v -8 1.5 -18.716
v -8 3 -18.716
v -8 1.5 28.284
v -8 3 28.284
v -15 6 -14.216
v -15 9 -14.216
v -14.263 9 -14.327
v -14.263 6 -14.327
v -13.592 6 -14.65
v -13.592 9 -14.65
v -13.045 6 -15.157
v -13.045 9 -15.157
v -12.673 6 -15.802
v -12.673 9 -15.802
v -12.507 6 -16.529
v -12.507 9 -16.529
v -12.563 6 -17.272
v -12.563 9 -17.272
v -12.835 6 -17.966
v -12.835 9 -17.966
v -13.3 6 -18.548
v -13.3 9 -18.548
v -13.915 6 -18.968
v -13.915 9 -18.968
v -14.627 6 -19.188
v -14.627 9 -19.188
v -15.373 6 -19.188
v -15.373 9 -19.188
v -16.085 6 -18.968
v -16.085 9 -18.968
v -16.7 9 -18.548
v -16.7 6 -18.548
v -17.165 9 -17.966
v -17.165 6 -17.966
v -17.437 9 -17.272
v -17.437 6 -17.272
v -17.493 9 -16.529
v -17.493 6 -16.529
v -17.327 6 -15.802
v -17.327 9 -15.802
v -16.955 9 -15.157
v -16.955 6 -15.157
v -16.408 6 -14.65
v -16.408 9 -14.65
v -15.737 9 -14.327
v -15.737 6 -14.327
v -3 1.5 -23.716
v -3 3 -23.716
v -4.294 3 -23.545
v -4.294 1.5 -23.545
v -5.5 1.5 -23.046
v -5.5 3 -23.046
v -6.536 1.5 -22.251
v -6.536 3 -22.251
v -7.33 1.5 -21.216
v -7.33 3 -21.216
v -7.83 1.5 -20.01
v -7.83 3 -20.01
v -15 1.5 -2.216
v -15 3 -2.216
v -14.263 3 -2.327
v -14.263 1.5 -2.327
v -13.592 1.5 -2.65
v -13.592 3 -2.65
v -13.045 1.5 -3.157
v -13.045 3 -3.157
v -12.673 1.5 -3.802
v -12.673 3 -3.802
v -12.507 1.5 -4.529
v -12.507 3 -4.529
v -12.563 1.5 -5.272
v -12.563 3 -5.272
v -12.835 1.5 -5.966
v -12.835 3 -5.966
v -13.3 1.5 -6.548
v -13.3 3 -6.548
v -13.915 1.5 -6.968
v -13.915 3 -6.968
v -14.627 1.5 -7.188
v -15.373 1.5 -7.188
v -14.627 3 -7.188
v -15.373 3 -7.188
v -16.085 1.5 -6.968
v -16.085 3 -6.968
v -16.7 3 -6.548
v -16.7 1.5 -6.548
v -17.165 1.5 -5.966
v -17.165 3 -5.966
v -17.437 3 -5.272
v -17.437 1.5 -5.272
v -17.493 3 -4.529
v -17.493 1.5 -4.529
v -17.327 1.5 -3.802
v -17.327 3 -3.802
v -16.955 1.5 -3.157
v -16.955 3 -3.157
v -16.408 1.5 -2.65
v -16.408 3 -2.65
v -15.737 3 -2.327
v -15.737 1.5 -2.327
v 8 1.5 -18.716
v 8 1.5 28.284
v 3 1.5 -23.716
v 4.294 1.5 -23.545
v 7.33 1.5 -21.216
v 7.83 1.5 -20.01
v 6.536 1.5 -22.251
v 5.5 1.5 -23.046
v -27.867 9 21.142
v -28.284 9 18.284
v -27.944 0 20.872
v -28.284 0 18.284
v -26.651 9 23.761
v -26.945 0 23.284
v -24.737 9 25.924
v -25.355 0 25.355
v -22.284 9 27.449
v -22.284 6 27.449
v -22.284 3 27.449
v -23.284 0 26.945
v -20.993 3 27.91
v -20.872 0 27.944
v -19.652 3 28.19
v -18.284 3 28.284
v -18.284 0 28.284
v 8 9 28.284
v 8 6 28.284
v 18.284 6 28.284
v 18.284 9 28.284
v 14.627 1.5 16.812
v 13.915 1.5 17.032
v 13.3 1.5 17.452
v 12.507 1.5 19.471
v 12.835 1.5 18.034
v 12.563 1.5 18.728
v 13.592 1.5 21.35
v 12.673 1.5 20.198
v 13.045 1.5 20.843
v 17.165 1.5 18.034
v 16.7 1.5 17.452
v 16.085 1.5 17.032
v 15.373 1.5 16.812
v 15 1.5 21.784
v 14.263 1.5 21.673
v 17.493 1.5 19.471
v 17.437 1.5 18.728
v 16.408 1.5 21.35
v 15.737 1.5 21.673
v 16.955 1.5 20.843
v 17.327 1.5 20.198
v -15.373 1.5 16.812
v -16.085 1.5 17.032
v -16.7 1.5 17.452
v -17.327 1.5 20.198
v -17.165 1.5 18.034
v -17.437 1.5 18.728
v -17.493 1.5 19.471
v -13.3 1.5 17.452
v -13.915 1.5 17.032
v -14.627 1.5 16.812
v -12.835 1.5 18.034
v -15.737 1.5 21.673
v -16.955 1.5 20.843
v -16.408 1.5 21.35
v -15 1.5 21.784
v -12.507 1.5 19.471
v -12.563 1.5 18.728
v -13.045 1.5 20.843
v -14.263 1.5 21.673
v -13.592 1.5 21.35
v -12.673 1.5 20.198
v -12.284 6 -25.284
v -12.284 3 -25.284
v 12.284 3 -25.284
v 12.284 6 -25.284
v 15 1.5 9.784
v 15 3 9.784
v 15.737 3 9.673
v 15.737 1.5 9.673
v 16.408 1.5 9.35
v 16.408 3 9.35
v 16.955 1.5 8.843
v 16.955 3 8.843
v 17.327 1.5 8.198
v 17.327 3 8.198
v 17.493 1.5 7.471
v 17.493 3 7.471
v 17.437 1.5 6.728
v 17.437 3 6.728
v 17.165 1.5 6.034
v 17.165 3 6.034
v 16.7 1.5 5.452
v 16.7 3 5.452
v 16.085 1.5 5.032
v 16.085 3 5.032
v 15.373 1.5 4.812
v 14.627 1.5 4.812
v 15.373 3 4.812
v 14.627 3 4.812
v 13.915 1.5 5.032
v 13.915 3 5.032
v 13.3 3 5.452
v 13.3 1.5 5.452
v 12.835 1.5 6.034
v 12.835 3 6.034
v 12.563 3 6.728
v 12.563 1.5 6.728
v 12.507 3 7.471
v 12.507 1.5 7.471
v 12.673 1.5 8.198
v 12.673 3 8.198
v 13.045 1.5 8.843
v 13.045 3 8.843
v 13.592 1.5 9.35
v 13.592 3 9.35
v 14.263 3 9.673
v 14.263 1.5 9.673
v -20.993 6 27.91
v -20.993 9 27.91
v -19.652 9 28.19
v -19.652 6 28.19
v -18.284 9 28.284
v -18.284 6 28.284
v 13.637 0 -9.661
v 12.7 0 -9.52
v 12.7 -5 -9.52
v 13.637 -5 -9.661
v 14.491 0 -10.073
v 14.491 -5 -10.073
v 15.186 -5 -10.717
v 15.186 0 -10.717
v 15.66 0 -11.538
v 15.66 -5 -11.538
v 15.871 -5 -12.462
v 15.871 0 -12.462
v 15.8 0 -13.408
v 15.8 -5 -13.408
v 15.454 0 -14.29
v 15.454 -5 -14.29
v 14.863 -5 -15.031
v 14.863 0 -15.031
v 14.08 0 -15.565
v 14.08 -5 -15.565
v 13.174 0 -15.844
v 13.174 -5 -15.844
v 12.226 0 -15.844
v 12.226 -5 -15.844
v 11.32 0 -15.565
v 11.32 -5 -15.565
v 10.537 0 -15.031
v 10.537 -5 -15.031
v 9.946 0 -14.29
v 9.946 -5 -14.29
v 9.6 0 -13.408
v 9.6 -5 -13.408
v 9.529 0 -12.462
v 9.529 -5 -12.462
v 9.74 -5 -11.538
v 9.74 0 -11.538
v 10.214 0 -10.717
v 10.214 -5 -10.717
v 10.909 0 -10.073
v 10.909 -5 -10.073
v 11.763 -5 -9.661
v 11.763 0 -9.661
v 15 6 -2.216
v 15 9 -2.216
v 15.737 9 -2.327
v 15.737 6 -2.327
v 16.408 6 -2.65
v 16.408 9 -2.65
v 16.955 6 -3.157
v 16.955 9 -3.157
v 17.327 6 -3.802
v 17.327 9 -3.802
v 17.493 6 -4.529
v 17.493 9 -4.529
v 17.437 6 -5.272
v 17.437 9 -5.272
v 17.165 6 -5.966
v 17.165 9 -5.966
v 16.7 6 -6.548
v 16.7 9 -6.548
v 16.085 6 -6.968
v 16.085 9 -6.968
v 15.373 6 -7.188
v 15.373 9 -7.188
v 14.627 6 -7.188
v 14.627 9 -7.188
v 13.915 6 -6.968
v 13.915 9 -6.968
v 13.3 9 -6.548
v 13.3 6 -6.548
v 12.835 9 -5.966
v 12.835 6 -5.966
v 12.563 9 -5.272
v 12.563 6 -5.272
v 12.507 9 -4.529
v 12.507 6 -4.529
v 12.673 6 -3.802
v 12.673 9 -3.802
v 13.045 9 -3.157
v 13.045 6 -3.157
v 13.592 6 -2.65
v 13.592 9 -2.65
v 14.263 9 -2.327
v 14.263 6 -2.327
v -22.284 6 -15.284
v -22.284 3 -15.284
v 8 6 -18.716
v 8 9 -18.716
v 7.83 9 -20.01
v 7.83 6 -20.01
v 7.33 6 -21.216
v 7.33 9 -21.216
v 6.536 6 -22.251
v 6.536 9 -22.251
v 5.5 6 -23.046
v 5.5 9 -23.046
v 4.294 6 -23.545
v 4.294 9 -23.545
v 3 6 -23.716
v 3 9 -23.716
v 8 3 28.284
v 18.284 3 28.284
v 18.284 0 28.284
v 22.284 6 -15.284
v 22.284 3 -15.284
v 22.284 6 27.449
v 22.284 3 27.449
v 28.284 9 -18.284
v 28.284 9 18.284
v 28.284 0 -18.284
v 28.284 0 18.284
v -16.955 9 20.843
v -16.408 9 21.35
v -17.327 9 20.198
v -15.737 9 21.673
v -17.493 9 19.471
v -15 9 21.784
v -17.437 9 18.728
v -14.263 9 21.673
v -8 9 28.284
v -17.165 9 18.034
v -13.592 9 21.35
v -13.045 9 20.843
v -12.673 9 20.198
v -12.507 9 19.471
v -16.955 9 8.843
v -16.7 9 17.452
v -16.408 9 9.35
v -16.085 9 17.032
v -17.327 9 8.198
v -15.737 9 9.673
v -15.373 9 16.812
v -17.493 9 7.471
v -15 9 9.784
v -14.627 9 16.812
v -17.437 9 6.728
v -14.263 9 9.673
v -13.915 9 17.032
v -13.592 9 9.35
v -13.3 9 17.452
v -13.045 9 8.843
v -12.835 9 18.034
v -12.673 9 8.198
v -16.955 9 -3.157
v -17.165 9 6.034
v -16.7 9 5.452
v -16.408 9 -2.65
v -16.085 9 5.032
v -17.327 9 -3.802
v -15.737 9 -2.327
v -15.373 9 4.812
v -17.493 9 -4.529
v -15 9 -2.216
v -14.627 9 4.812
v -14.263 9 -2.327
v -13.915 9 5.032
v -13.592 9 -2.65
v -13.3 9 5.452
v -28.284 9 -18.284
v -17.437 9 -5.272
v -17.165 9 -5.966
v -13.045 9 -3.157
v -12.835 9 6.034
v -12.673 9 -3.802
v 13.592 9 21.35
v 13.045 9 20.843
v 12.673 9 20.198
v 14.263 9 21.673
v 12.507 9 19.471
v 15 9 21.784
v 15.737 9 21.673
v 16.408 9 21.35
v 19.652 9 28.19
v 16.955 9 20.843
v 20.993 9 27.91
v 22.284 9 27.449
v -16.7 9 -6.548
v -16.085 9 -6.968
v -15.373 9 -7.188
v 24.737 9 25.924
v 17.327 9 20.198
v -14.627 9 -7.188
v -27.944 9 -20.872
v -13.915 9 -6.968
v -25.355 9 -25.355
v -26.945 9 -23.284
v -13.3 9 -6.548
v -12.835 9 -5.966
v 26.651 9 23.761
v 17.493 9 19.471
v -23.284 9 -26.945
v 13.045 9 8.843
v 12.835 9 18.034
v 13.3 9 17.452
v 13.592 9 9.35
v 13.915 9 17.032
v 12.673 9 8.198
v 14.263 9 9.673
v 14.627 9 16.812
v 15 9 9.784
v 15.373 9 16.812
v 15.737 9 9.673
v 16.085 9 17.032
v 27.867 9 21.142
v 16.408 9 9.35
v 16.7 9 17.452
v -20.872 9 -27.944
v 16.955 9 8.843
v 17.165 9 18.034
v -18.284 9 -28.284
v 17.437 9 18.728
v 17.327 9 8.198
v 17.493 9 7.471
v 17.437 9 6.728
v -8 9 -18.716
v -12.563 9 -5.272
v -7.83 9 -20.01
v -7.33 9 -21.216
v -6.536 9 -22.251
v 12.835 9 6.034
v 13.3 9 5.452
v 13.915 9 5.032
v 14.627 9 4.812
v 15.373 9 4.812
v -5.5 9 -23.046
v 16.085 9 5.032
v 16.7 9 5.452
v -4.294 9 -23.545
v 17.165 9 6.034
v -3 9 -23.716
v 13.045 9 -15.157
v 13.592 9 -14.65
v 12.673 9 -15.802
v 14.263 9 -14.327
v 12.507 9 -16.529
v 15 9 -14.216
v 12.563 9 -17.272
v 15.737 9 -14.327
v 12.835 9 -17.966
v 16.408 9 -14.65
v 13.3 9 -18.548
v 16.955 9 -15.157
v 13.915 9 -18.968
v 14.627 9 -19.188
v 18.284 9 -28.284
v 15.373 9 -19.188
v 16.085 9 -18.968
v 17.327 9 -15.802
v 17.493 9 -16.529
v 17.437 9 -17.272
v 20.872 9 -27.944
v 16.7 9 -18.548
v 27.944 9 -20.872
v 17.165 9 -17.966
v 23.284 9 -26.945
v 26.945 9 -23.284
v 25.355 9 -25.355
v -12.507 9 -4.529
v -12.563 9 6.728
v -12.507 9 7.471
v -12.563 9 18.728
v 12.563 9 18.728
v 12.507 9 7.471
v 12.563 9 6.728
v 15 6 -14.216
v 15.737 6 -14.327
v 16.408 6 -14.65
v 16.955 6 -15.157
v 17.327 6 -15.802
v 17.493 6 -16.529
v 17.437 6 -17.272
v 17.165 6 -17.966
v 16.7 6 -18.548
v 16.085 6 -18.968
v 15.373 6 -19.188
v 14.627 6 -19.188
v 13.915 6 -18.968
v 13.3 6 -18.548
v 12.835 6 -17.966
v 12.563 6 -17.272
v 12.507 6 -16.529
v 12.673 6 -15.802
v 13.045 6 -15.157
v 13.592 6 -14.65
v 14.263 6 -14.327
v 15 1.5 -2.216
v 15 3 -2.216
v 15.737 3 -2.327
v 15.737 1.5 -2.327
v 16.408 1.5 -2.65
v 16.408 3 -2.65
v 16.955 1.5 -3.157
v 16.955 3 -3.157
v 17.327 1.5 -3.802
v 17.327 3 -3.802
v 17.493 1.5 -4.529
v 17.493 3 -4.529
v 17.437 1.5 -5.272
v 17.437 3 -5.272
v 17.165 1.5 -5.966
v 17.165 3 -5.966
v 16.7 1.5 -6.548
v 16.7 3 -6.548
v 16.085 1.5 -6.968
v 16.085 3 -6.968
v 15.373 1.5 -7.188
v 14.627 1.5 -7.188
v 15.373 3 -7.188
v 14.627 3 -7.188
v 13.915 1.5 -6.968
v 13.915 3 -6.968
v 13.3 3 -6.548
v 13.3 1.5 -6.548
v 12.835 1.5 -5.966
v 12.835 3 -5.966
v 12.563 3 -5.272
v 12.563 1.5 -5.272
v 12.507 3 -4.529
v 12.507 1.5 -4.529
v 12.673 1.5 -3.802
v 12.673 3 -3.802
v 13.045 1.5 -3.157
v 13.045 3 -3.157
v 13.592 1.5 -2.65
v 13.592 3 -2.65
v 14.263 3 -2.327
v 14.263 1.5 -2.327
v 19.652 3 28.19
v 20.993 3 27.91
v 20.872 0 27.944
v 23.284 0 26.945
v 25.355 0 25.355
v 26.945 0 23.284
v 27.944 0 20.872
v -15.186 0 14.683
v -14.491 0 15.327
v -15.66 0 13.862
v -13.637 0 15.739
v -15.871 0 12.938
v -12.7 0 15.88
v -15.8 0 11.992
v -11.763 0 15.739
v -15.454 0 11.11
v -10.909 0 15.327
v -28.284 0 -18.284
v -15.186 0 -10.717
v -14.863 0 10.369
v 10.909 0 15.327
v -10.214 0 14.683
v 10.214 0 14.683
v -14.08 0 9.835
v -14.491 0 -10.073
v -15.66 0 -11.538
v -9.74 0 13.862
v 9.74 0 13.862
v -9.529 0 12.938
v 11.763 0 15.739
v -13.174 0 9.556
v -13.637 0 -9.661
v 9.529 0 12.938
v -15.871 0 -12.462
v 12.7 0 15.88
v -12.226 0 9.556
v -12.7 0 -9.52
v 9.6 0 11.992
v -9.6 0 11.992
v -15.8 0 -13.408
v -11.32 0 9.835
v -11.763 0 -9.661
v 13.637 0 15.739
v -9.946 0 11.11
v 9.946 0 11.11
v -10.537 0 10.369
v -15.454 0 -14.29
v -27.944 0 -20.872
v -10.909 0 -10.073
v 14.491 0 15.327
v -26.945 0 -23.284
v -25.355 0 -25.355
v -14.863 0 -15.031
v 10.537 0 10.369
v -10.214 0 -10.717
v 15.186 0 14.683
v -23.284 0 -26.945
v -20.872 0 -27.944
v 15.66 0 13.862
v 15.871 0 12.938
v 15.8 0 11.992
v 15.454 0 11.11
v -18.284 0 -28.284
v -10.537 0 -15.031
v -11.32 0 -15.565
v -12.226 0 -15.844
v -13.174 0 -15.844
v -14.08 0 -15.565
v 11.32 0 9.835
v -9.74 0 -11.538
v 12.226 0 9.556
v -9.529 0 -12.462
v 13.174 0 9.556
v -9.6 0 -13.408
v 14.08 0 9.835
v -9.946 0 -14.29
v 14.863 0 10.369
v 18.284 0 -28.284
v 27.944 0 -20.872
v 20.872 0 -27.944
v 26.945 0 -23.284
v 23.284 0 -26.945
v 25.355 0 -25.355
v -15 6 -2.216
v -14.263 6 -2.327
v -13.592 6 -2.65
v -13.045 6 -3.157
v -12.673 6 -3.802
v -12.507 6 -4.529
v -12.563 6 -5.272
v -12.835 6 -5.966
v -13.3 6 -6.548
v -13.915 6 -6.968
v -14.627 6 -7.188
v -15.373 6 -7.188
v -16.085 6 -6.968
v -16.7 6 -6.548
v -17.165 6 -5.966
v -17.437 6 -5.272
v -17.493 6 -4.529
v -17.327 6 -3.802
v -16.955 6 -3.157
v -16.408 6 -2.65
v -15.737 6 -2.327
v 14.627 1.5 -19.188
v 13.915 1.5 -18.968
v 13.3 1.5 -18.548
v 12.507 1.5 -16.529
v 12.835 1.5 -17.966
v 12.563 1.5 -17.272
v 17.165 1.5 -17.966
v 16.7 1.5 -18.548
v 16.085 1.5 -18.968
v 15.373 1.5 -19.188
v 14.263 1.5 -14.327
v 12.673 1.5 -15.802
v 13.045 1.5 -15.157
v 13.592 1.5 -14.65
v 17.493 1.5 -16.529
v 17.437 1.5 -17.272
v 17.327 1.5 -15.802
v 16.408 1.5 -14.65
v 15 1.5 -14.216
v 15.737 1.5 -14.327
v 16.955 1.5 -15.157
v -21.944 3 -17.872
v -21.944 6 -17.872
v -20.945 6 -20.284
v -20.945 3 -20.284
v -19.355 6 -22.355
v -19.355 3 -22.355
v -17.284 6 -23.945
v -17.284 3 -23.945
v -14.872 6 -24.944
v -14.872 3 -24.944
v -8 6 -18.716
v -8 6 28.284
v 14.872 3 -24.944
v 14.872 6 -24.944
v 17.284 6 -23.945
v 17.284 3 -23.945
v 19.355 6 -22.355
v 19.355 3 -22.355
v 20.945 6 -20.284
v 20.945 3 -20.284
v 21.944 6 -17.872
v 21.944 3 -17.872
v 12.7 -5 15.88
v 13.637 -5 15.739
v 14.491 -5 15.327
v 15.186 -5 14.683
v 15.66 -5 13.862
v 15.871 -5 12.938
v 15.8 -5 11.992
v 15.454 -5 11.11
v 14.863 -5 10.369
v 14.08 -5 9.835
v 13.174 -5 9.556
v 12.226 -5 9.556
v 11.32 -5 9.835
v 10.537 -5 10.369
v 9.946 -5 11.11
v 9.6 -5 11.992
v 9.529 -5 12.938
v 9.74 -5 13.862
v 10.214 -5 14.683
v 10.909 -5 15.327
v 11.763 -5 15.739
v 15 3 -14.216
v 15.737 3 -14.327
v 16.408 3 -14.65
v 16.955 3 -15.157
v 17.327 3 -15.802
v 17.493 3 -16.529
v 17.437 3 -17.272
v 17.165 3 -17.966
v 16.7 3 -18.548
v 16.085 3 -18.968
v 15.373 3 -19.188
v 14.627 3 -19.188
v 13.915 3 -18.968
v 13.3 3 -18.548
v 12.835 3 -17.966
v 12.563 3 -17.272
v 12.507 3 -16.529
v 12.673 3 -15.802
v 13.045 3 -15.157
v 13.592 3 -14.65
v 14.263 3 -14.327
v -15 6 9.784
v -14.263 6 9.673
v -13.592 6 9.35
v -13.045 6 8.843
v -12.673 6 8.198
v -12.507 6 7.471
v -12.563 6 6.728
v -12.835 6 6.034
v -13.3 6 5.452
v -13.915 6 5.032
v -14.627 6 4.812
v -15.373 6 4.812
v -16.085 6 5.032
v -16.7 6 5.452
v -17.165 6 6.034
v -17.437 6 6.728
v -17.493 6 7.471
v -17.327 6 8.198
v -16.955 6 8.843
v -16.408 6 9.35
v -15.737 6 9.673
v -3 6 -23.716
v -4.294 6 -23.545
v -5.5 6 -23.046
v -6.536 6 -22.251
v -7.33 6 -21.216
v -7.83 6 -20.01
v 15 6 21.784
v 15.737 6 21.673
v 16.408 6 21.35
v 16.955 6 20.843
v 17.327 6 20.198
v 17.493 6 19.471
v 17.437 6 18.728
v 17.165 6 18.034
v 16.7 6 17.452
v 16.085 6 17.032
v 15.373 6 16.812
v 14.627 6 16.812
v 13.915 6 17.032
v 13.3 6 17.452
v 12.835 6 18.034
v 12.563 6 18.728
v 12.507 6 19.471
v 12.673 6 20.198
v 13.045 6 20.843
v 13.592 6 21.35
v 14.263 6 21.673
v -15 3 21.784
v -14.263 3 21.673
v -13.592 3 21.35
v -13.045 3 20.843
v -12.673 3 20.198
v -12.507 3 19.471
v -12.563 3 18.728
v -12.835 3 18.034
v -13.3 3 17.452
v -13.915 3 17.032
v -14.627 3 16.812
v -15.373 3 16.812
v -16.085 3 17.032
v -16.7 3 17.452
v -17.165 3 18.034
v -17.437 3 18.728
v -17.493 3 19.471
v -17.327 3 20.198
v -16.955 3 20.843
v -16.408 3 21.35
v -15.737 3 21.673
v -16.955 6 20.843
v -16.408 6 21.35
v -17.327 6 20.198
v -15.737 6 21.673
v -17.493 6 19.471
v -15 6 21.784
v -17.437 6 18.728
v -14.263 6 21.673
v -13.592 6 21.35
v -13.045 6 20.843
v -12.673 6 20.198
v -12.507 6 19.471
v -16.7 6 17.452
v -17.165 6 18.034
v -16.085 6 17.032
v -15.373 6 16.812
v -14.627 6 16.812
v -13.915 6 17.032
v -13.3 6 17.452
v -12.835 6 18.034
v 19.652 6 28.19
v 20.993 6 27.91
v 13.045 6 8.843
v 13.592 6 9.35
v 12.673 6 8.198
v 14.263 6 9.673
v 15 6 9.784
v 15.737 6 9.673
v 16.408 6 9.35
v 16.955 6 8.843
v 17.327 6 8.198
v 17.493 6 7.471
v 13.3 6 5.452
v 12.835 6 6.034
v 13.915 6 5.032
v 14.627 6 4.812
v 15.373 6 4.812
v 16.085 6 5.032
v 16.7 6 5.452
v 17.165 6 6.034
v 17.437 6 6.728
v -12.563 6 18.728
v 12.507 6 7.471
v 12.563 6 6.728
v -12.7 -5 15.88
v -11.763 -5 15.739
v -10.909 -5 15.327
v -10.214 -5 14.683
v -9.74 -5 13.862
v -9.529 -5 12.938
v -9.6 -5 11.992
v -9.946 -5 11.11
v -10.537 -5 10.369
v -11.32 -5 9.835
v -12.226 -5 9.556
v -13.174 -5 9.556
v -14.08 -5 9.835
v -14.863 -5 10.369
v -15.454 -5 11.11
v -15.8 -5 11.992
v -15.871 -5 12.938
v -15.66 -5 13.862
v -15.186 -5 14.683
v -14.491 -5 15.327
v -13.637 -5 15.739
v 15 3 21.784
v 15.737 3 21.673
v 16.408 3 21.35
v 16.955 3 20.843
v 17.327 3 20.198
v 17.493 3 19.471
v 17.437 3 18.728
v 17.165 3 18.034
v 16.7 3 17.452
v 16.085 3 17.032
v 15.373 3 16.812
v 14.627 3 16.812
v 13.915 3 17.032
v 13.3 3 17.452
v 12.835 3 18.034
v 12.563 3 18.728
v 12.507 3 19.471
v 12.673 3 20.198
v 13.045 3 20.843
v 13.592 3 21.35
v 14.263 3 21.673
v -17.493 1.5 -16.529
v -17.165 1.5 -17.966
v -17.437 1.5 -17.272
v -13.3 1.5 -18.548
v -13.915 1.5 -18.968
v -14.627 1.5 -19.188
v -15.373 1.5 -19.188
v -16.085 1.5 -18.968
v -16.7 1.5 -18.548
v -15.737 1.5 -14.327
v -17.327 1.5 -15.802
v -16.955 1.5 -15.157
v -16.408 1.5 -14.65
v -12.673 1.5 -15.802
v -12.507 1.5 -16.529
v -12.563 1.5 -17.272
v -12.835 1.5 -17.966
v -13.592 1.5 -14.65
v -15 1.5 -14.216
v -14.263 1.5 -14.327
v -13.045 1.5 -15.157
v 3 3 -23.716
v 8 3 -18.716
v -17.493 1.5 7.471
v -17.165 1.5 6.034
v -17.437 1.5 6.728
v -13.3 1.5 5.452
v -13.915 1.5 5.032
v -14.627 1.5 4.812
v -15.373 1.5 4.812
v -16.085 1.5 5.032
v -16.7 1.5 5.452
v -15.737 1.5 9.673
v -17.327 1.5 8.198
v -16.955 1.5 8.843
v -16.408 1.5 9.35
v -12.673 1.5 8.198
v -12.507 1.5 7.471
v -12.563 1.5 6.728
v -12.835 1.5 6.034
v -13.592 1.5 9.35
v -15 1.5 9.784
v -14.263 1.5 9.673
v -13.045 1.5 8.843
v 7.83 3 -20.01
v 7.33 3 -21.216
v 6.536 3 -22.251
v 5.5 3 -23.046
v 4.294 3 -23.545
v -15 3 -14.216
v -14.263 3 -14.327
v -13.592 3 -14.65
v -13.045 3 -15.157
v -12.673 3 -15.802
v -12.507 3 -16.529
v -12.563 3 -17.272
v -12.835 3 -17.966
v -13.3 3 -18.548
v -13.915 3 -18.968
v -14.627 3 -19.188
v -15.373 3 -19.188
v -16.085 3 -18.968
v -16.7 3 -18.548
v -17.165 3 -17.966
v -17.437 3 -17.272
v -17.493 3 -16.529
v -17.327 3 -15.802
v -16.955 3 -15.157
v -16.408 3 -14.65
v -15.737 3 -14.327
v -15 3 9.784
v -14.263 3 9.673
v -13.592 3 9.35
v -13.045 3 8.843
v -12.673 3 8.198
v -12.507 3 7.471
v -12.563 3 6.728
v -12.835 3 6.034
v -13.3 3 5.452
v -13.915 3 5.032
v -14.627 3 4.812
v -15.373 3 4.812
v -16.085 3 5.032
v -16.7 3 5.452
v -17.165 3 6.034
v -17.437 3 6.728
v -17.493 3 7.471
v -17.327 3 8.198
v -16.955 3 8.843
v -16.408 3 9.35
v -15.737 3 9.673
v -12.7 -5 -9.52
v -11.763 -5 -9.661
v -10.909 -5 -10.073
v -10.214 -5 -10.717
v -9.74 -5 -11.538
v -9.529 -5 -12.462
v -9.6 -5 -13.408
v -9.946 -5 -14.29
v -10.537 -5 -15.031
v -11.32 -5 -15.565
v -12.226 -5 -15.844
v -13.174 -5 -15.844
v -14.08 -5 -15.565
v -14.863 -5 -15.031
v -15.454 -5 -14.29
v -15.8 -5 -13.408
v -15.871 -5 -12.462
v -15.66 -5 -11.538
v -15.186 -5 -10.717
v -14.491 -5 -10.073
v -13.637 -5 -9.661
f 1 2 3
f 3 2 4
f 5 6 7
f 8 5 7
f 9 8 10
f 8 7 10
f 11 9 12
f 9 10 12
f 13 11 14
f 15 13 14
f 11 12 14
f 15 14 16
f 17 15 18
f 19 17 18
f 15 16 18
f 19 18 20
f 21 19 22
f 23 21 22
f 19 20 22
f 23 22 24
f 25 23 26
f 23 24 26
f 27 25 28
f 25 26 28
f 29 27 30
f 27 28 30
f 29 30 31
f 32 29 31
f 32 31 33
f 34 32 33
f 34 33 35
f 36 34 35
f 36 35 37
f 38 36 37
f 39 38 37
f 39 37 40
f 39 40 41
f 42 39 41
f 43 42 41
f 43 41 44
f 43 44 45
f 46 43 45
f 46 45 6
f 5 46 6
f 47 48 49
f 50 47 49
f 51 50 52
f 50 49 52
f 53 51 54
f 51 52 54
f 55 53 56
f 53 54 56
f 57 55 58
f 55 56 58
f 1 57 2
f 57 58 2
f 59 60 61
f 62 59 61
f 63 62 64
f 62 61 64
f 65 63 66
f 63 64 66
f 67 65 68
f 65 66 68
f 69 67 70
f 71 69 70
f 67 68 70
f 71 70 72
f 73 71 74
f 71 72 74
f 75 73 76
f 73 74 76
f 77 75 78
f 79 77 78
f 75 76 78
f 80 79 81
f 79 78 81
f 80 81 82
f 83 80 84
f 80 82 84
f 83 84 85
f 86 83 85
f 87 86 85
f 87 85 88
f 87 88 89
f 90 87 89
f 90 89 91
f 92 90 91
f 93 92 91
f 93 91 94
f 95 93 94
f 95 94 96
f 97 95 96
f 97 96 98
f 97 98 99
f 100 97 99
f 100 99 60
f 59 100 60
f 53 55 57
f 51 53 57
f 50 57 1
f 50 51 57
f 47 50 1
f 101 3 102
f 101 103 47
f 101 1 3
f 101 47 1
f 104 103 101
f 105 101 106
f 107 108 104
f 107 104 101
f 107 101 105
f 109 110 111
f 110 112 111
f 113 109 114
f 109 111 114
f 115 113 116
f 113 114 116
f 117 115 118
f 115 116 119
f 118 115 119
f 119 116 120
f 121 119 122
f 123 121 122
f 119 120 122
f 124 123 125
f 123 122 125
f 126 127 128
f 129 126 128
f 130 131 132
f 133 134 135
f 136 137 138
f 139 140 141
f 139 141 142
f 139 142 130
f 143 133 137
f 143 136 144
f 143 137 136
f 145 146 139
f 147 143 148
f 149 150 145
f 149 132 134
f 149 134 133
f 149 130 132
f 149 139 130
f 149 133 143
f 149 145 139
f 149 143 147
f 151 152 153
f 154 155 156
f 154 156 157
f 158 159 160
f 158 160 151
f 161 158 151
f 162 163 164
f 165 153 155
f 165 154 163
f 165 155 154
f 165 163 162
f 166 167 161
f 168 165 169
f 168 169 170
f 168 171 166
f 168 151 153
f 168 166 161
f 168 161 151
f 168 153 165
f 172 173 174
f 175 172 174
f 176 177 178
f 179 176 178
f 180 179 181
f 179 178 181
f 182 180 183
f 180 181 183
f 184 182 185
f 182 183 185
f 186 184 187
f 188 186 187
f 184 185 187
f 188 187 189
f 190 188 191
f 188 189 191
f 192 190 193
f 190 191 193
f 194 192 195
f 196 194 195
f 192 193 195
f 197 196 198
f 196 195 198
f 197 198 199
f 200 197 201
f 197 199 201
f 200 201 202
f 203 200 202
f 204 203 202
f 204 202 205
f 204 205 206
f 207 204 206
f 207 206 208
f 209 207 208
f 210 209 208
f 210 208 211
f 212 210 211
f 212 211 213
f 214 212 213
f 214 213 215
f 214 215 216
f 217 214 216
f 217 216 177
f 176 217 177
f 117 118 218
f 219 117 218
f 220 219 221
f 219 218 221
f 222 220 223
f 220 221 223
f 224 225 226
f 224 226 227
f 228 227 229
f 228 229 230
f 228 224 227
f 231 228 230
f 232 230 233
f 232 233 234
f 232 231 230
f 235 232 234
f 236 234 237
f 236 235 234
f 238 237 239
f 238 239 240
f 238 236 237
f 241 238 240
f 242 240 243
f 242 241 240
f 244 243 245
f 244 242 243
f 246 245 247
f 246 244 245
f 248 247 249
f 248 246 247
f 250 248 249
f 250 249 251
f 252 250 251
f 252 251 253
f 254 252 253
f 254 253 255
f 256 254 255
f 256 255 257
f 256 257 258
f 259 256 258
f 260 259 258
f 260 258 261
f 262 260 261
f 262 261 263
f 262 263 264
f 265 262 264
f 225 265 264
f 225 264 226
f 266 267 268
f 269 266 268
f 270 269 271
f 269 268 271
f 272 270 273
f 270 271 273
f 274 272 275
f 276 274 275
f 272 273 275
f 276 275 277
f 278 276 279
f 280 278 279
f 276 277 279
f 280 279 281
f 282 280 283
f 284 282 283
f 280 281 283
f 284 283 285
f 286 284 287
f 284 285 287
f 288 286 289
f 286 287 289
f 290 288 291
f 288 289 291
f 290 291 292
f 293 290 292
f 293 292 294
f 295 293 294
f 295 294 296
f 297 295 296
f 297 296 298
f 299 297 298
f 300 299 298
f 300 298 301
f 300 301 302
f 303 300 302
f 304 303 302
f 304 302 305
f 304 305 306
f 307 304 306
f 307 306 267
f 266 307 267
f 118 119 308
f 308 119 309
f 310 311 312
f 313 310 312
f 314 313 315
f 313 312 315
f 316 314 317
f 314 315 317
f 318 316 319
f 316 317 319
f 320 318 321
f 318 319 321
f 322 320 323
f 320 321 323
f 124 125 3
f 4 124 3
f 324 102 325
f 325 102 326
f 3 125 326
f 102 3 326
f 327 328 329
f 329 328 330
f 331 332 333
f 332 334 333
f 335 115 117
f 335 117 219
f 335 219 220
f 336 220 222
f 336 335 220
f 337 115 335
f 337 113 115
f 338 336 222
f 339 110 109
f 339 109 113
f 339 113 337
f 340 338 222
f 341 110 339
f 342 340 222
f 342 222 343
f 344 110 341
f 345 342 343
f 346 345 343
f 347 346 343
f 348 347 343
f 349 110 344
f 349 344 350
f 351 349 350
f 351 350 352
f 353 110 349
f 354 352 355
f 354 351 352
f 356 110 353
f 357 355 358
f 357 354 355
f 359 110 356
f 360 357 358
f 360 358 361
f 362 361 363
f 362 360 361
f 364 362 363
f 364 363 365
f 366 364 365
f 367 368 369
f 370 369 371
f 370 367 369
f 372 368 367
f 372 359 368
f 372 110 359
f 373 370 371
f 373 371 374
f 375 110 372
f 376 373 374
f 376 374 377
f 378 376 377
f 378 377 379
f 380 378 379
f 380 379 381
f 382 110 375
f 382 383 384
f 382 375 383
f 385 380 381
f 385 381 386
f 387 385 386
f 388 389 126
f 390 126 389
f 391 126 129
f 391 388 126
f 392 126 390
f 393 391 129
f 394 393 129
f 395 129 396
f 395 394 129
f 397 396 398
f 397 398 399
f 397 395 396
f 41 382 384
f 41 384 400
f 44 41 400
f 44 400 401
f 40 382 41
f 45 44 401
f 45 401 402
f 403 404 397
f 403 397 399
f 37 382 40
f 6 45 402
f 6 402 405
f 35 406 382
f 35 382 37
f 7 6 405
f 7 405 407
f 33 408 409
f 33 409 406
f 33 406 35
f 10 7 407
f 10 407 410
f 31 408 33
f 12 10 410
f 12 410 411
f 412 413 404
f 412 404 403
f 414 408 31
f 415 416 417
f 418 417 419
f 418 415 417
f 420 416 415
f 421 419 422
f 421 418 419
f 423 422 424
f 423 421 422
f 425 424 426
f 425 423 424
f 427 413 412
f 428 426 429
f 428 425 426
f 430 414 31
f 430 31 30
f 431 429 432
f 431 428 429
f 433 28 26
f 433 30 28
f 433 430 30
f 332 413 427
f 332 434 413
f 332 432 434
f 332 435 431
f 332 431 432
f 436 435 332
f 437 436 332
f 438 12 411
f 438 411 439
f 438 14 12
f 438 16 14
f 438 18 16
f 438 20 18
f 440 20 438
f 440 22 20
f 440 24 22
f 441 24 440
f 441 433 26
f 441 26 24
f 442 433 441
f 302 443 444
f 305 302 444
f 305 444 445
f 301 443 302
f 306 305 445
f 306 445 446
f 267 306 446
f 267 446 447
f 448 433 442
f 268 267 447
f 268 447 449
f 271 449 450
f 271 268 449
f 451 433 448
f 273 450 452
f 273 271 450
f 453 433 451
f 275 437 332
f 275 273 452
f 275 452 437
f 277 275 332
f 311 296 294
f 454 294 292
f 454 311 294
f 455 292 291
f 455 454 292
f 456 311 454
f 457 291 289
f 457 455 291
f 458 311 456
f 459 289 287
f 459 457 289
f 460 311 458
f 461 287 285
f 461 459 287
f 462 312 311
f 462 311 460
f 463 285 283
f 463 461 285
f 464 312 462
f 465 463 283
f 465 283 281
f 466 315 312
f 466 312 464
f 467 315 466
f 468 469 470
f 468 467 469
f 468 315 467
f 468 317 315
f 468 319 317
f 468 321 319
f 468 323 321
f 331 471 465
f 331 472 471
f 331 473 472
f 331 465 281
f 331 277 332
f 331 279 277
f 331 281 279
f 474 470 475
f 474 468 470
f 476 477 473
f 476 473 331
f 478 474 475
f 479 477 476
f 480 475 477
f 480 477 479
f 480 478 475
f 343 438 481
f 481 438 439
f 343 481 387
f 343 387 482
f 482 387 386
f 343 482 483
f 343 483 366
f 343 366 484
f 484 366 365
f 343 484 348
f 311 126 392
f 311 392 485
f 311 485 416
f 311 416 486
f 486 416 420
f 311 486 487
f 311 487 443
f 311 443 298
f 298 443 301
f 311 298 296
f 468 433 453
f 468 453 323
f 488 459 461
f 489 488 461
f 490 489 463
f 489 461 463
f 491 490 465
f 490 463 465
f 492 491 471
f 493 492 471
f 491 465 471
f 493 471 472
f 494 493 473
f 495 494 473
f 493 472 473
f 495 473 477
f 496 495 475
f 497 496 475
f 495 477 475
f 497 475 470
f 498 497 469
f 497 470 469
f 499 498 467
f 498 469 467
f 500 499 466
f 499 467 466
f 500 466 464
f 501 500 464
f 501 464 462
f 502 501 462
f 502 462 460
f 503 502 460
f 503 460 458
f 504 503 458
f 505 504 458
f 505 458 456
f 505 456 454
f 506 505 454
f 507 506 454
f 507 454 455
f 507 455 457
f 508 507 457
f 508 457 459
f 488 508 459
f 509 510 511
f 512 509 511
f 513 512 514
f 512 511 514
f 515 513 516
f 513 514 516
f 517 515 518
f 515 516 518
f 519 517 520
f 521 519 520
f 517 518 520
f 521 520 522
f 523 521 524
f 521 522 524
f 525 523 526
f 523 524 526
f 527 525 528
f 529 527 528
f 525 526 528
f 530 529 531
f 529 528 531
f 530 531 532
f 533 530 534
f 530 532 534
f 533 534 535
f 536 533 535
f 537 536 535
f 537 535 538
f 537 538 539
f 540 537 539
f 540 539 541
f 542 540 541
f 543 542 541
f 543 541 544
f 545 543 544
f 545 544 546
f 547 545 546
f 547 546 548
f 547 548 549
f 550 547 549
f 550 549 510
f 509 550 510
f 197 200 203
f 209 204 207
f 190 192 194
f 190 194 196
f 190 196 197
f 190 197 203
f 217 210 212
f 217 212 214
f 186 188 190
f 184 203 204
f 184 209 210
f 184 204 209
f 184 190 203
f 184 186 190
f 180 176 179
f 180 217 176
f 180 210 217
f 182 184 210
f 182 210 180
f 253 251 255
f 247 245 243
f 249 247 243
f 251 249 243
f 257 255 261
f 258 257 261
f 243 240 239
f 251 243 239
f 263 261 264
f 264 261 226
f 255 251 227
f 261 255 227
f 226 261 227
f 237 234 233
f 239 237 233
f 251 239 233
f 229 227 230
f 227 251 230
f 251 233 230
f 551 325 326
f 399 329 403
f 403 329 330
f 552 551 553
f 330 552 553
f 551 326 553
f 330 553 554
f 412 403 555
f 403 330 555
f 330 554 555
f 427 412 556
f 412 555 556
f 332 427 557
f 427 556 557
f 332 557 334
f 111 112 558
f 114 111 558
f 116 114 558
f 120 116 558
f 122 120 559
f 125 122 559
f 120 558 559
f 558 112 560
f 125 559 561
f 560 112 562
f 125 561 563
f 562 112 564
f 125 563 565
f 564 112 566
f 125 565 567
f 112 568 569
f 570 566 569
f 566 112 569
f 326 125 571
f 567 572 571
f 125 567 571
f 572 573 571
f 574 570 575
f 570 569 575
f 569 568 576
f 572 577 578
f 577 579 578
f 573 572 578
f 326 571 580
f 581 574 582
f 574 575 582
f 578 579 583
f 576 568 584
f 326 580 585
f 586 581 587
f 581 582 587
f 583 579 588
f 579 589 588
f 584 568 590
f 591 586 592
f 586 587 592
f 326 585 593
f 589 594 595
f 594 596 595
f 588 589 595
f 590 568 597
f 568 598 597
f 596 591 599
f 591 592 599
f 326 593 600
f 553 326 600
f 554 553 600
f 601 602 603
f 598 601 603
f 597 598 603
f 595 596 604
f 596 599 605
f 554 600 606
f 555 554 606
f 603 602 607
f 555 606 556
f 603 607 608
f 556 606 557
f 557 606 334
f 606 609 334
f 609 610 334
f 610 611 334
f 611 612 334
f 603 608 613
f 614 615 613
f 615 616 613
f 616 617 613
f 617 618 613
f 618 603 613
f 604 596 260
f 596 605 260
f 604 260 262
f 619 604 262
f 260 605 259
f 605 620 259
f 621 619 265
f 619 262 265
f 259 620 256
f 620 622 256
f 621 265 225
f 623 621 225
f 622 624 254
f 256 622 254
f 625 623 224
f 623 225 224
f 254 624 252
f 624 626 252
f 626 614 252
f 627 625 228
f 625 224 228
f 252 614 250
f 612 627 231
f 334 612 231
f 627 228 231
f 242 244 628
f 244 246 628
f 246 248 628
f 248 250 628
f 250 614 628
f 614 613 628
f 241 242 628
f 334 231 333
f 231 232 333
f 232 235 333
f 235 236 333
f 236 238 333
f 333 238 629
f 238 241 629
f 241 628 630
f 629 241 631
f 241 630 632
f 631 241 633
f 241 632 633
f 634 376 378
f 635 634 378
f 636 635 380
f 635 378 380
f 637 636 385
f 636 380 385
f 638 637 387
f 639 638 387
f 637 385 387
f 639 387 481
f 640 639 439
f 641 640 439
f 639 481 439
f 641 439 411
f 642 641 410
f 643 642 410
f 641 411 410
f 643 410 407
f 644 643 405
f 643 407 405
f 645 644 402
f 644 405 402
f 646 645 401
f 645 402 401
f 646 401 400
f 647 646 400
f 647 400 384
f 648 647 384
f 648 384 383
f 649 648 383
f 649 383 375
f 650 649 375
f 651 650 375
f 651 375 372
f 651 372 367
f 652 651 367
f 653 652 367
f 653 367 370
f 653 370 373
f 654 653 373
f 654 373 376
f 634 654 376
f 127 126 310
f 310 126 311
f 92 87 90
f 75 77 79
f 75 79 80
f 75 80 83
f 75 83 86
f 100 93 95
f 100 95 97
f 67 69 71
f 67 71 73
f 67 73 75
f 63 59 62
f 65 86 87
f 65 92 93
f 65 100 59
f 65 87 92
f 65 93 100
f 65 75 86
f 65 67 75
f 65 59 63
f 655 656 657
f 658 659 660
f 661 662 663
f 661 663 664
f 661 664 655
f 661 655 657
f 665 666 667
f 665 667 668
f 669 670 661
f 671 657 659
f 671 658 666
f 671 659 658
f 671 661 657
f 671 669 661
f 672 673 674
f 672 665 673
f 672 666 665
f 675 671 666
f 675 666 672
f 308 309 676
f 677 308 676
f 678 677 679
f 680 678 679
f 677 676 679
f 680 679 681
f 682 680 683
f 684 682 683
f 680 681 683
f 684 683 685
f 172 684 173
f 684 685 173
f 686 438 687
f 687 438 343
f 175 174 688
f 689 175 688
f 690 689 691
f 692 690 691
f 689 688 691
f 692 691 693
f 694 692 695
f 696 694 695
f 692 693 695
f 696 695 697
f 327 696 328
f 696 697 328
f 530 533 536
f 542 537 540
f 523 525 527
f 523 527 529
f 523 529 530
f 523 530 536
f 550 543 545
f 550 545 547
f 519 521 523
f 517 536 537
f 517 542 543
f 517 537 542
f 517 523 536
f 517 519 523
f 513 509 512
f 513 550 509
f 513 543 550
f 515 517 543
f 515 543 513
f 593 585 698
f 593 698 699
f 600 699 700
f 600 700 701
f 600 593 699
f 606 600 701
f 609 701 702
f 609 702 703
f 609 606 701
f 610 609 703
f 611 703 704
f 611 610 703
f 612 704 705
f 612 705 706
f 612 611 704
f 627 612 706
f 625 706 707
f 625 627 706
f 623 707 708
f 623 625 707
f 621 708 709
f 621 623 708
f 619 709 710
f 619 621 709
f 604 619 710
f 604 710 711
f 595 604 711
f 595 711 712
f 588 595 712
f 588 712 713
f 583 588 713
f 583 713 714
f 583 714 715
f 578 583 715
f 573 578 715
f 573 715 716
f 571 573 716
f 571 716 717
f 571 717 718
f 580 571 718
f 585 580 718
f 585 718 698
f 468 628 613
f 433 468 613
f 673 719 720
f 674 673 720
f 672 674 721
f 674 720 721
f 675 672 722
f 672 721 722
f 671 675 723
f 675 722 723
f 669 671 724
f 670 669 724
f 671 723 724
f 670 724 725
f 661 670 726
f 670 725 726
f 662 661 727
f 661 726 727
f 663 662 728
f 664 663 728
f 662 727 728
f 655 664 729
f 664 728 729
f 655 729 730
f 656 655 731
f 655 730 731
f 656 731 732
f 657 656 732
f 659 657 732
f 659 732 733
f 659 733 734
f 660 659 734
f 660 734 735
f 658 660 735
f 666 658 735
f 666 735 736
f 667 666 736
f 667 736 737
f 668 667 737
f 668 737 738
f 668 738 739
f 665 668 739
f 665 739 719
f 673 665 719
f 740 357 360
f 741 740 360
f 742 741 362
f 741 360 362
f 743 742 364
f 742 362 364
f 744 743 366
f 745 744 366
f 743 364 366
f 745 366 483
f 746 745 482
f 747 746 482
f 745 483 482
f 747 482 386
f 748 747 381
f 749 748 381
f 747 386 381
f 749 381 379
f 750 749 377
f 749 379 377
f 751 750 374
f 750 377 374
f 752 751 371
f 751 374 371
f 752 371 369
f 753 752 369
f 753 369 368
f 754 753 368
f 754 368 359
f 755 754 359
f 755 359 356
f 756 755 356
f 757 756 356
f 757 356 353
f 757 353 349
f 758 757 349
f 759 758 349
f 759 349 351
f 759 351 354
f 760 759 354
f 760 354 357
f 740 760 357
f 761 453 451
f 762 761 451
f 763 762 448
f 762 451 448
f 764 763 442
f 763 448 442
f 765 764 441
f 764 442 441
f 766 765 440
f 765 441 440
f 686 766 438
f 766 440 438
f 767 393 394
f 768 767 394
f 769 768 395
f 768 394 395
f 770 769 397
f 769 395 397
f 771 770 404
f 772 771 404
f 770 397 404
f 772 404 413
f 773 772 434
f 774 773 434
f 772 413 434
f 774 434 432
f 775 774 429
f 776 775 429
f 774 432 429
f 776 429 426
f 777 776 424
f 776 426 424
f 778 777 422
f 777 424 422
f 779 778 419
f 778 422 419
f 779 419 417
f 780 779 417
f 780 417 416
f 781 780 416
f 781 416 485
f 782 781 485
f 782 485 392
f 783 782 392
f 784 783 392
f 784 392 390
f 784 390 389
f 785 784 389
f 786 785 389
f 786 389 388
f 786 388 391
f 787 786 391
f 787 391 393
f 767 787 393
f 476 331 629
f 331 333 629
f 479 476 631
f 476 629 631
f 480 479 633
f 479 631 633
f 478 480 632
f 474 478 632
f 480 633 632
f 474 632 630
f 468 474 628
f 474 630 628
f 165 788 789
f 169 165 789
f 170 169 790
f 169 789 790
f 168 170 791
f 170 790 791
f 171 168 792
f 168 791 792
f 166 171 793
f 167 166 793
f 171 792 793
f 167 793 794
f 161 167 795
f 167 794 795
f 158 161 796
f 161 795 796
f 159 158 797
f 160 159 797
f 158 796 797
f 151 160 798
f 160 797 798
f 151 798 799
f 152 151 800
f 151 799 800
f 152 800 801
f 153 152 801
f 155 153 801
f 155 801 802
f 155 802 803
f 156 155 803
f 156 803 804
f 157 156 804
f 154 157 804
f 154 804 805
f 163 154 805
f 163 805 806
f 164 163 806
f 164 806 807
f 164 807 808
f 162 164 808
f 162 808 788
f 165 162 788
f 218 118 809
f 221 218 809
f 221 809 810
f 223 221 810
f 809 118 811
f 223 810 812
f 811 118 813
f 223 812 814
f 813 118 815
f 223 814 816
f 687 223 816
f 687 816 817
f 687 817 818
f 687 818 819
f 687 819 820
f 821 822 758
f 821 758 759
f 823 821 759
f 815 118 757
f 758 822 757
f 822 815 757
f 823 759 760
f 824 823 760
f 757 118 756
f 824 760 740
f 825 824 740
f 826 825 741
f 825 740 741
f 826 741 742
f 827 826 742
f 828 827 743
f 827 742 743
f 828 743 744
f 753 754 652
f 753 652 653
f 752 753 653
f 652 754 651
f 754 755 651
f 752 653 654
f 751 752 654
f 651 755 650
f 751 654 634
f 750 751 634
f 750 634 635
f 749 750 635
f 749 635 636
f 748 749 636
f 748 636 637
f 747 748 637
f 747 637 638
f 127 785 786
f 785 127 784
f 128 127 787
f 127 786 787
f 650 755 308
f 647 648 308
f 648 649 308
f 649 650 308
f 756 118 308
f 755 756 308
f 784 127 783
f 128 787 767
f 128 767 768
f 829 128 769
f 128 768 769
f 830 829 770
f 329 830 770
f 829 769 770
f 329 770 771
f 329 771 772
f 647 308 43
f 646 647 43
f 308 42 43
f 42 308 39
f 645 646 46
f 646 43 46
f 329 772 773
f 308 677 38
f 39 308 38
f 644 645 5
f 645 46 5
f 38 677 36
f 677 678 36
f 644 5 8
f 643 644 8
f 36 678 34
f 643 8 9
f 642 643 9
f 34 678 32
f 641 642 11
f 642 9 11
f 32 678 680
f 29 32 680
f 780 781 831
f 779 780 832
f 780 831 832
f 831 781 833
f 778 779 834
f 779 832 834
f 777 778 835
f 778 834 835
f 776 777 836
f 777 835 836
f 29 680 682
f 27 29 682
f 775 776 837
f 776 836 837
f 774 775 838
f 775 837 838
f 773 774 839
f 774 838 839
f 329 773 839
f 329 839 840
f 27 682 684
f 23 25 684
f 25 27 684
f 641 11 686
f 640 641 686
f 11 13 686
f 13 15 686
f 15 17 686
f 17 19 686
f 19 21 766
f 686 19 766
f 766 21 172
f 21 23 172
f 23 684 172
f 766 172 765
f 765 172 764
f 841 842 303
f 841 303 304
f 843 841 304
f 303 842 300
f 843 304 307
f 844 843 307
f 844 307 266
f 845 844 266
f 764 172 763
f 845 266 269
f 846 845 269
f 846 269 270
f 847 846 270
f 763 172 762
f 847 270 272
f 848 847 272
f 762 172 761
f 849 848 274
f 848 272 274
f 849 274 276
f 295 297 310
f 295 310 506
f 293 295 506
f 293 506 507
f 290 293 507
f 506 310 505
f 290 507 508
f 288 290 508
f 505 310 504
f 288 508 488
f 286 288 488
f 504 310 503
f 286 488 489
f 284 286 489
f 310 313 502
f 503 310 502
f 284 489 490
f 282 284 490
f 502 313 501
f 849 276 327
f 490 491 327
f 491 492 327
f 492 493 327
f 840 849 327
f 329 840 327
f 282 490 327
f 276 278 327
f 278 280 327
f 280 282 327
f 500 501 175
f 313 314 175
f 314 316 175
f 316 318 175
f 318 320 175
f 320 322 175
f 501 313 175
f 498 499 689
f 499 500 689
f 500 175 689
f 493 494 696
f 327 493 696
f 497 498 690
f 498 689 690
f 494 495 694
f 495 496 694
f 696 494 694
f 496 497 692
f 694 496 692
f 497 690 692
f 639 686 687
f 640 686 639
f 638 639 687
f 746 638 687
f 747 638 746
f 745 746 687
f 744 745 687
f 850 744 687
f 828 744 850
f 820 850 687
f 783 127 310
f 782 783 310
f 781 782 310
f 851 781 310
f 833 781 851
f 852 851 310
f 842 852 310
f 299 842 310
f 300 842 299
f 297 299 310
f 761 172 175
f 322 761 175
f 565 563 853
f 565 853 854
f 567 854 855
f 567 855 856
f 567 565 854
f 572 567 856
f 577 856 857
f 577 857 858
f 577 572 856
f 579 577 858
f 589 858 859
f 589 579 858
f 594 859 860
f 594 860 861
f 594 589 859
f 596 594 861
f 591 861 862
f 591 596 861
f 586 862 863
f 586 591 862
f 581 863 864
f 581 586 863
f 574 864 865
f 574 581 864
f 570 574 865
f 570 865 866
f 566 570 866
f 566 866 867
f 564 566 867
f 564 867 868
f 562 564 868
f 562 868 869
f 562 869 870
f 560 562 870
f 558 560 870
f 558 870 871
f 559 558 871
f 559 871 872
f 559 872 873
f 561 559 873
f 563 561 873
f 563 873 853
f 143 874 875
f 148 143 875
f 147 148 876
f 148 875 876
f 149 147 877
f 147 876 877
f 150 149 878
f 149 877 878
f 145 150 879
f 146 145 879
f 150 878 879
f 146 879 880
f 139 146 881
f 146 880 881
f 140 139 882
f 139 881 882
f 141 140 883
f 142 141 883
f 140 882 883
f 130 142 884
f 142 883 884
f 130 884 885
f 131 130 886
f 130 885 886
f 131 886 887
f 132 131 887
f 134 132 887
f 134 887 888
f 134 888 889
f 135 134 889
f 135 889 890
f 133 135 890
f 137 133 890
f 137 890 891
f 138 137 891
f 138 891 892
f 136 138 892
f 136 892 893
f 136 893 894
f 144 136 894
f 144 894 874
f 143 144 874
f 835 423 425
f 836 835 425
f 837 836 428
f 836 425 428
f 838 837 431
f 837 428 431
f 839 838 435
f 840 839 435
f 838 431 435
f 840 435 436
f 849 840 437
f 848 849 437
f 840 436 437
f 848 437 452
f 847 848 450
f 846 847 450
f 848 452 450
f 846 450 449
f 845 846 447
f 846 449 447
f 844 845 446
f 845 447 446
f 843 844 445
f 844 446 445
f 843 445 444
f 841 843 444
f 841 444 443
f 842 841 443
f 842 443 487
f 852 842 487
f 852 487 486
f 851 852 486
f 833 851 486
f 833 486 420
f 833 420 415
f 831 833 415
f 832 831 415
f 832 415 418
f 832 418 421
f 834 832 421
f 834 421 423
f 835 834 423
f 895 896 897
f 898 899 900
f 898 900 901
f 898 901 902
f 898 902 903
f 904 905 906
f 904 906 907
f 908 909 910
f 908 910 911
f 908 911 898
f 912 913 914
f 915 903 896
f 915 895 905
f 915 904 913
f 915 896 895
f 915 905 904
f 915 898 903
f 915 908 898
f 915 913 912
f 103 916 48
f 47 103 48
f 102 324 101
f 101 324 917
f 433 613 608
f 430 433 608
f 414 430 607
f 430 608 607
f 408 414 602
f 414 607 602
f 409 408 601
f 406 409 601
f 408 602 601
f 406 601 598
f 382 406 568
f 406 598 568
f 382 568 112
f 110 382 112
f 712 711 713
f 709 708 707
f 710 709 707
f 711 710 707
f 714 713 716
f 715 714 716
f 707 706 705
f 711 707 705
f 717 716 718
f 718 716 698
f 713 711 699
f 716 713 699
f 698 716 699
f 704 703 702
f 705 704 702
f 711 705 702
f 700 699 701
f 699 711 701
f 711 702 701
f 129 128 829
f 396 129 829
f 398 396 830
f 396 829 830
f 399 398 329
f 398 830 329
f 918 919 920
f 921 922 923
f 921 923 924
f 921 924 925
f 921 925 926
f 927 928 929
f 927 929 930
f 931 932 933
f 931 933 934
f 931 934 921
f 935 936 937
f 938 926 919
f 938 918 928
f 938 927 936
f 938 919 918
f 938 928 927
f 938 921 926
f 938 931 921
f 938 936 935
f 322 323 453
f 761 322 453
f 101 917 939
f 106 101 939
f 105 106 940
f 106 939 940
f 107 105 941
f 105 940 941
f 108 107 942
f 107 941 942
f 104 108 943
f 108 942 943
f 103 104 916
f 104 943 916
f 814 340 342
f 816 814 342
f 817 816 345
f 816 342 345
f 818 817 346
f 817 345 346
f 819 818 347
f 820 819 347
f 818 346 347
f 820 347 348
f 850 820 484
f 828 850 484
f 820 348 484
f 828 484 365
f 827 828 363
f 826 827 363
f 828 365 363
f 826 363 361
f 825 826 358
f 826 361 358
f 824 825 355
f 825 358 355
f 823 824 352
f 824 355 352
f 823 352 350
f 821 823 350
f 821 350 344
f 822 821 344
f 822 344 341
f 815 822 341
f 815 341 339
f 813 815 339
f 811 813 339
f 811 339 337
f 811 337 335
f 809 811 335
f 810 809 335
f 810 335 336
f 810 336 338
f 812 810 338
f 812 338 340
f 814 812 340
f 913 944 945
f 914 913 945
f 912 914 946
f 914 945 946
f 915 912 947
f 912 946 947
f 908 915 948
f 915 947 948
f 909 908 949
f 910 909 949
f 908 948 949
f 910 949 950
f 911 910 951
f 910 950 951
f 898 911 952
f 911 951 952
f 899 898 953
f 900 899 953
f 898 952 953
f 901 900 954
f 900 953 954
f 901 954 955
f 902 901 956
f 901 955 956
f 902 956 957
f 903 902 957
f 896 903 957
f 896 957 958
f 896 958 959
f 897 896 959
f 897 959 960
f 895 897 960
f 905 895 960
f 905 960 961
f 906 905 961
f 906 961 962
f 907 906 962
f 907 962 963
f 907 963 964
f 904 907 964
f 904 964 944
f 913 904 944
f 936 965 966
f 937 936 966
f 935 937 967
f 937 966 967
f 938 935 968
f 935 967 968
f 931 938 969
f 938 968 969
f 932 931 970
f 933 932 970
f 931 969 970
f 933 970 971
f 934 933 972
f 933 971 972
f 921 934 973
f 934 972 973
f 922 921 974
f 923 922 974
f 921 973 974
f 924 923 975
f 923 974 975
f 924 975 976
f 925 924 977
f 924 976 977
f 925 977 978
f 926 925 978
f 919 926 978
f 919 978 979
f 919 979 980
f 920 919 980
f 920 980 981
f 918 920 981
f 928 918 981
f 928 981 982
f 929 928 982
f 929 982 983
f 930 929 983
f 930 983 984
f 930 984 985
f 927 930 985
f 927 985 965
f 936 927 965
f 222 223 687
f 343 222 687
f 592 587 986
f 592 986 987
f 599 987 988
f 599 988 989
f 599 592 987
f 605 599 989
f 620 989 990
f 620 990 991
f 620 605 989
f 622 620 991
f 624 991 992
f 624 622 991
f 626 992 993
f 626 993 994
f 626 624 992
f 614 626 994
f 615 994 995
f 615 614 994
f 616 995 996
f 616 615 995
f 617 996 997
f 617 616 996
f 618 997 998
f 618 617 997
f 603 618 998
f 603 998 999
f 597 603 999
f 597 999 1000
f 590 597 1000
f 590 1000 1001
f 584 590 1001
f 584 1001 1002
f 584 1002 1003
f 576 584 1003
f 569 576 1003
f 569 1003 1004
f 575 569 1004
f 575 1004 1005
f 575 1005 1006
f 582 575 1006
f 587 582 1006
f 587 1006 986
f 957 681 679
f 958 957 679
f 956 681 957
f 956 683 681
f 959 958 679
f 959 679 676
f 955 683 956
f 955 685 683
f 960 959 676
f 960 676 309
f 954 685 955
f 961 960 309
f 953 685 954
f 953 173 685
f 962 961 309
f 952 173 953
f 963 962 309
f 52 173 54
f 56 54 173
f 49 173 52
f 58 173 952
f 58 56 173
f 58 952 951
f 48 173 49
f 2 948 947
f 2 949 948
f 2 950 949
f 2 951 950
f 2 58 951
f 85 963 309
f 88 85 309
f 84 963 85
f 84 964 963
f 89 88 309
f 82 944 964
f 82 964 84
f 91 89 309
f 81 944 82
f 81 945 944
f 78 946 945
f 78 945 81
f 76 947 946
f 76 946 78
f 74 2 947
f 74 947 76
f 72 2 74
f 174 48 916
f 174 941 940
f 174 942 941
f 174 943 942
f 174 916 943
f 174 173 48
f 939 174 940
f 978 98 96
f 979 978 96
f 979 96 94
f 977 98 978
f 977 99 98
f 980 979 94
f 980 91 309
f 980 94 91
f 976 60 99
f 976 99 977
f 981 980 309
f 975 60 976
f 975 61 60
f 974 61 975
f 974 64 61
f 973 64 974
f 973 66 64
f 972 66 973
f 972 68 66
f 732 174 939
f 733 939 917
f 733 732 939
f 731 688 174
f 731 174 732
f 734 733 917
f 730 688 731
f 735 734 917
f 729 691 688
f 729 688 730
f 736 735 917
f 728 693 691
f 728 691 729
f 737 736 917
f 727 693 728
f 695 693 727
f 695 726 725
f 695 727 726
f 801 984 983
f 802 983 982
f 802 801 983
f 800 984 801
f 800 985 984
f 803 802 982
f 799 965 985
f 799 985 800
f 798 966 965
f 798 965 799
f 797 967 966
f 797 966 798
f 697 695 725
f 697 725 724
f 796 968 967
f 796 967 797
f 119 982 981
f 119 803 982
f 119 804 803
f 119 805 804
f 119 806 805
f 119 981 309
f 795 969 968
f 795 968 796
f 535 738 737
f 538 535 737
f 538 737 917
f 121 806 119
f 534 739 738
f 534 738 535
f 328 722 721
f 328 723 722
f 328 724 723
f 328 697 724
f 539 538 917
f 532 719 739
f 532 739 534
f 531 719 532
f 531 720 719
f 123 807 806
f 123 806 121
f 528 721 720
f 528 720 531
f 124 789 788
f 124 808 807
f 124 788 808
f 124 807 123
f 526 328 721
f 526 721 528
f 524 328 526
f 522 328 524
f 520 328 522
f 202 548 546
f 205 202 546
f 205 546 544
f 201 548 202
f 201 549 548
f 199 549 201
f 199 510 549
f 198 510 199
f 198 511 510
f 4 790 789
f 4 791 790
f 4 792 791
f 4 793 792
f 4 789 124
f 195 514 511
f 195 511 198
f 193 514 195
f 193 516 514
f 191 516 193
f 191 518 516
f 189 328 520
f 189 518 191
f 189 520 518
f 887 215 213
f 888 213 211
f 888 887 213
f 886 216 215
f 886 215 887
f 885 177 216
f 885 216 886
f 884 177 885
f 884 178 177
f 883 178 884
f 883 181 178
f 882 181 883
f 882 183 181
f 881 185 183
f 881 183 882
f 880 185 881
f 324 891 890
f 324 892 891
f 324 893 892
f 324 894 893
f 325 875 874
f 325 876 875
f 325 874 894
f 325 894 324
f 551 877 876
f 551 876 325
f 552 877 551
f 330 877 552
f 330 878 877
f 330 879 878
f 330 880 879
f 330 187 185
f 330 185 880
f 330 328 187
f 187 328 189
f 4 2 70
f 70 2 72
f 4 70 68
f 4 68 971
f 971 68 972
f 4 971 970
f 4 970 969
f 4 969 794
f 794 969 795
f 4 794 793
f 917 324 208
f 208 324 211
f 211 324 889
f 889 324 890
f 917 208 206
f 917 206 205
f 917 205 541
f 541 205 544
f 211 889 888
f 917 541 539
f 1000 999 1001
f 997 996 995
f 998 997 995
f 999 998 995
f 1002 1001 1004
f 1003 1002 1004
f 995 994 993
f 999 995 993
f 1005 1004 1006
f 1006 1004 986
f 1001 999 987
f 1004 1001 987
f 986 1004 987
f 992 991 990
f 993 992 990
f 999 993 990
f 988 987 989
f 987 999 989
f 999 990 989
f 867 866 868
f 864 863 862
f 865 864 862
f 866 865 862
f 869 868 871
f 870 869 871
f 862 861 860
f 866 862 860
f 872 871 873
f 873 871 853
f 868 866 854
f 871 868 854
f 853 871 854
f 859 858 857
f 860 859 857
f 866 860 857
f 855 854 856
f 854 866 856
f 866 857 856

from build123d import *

# Parameters (mm, degrees)
EXTRUDE_1_DEPTH     = 3
SKETCH_3_R          = 3.18
EXTRUDE_2_DEPTH     = 8
EXTRUDE_3_DEPTH     = 3
EXTRUDE_4_DEPTH     = 3
SKETCH_7_R          = 2.5
CUT_EXTRUDE_1_DEPTH = 7.5


with BuildPart() as part:
    # 草图2 → 凸台-拉伸1 (new body)
    with BuildSketch(Plane(origin=(0, 0, 0), x_dir=(1, 0, 0), z_dir=(0, 1, 0))):
        with BuildLine():
            Line((28.284271247, -18.284271247), (28.284271247, 18.284271247))
            ThreePointArc((28.284271247, 18.284271247), (25.355339059, 25.355339059), (18.284271247, 28.284271247))
            Line((18.284271247, 28.284271247), (-18.284271247, 28.284271247))
            ThreePointArc((-18.284271247, 28.284271247), (-25.355339059, 25.355339059), (-28.284271247, 18.284271247))
            Line((-28.284271247, 18.284271247), (-28.284271247, -18.284271247))
            ThreePointArc((-28.284271247, -18.284271247), (-25.355339059, -25.355339059), (-18.284271247, -28.284271247))
            Line((-18.284271247, -28.284271247), (18.284271247, -28.284271247))
            ThreePointArc((18.284271247, -28.284271247), (25.355339059, -25.355339059), (28.284271247, -18.284271247))
        make_face()
    extrude(amount=EXTRUDE_1_DEPTH)

    # 草图3 → 凸台-拉伸2 (add)
    with BuildSketch(Plane(origin=(0, 3, 0), x_dir=(1, 0, 0), z_dir=(0, 1, 0))):
        with Locations(Location((12.7, 12.7, 0), (0, 0, 270))):
            Circle(SKETCH_3_R)
        with Locations(Location((12.7, -12.7, 0), (0, 0, 270))):
            Circle(SKETCH_3_R)
        with Locations(Location((-12.7, -12.7, 0), (0, 0, 270))):
            Circle(SKETCH_3_R)
        with Locations(Location((-12.7, 12.7, 0), (0, 0, 270))):
            Circle(SKETCH_3_R)
    extrude(amount=-EXTRUDE_2_DEPTH)

    # 草图5 → 凸台-拉伸3 (add)
    with BuildSketch(Plane(origin=(0, 3, 0), x_dir=(1, 0, 0), z_dir=(0, 1, 0))):
        with BuildLine():
            Line((-12.284271247, 25.284271247), (12.284271247, 25.284271247))
            ThreePointArc((12.284271247, 25.284271247), (19.355339059, 22.355339059), (22.284271247, 15.284271247))
            Line((22.284271247, 15.284271247), (22.284271247, -27.449422637))
            ThreePointArc((22.284271247, -27.449422637), (26.650871513, -23.761496823), (28.284271247, -18.284271247))
            Line((28.284271247, -18.284271247), (28.284271247, 18.284271247))
            ThreePointArc((28.284271247, 18.284271247), (25.355339059, 25.355339059), (18.284271247, 28.284271247))
            Line((18.284271247, 28.284271247), (-18.284271247, 28.284271247))
            ThreePointArc((-18.284271247, 28.284271247), (-25.355339059, 25.355339059), (-28.284271247, 18.284271247))
            Line((-28.284271247, 18.284271247), (-28.284271247, -18.284271247))
            ThreePointArc((-28.284271247, -18.284271247), (-26.650871513, -23.761496823), (-22.284271247, -27.449422637))
            Line((-22.284271247, -27.449422637), (-22.284271247, 15.284271247))
            ThreePointArc((-22.284271247, 15.284271247), (-19.355339059, 22.355339059), (-12.284271247, 25.284271247))
        make_face()
    extrude(amount=EXTRUDE_3_DEPTH)

    # 草图6 → 凸台-拉伸4 (add)
    with BuildSketch(Plane(origin=(0, 6, 0), x_dir=(1, 0, 0), z_dir=(0, 1, 0))):
        with BuildLine():
            Line((-28.284271247, 18.284271247), (-28.284271247, -18.284271247))
            ThreePointArc((-28.284271247, -18.284271247), (-26.650871513, -23.761496823), (-22.284271247, -27.449422637))
            ThreePointArc((-22.284271247, -27.449422637), (-20.327367684, -28.073334377), (-18.284271247, -28.284271247))
            Line((-18.284271247, -28.284271247), (18.284271247, -28.284271247))
            ThreePointArc((18.284271247, -28.284271247), (20.327367684, -28.073334377), (22.284271247, -27.449422637))
            ThreePointArc((22.284271247, -27.449422637), (26.650871513, -23.761496823), (28.284271247, -18.284271247))
            Line((28.284271247, -18.284271247), (28.284271247, 18.284271247))
            ThreePointArc((28.284271247, 18.284271247), (25.355339059, 25.355339059), (18.284271247, 28.284271247))
            Line((18.284271247, 28.284271247), (-18.284271247, 28.284271247))
            ThreePointArc((-18.284271247, 28.284271247), (-25.355339059, 25.355339059), (-28.284271247, 18.284271247))
        make_face()
    extrude(amount=EXTRUDE_4_DEPTH)

    # 草图7 → 切除-拉伸1 (cut)
    with BuildSketch(Plane(origin=(0, 9, 0), x_dir=(1, 0, 0), z_dir=(0, 1, 0))):
        with Locations(Location((-15, 16.715728753, 0), (0, 0, 270))):
            Circle(SKETCH_7_R)
        with Locations(Location((-15, 4.715728753, 0), (0, 0, 270))):
            Circle(SKETCH_7_R)
        with Locations(Location((-15, -7.284271247, 0), (0, 0, 270))):
            Circle(SKETCH_7_R)
        with Locations(Location((-15, -19.284271247, 0), (0, 0, 270))):
            Circle(SKETCH_7_R)
        with Locations(Location((15, -19.284271247, 0), (0, 0, 270))):
            Circle(SKETCH_7_R)
        with Locations(Location((15, -7.284271247, 0), (0, 0, 270))):
            Circle(SKETCH_7_R)
        with Locations(Location((15, 4.715728753, 0), (0, 0, 270))):
            Circle(SKETCH_7_R)
        with Locations(Location((15, 16.715728753, 0), (0, 0, 270))):
            Circle(SKETCH_7_R)
        with BuildLine():
            Line((-8, -28.284271247), (8, -28.284271247))
            Line((8, -28.284271247), (8, 18.715728753))
            ThreePointArc((8, 18.715728753), (6.535533906, 22.251262658), (3, 23.715728753))
            Line((3, 23.715728753), (-3, 23.715728753))
            ThreePointArc((-3, 23.715728753), (-6.535533906, 22.251262658), (-8, 18.715728753))
            Line((-8, 18.715728753), (-8, -28.284271247))
        make_face()
    extrude(amount=-CUT_EXTRUDE_1_DEPTH, mode=Mode.SUBTRACT)


solid = part.part
